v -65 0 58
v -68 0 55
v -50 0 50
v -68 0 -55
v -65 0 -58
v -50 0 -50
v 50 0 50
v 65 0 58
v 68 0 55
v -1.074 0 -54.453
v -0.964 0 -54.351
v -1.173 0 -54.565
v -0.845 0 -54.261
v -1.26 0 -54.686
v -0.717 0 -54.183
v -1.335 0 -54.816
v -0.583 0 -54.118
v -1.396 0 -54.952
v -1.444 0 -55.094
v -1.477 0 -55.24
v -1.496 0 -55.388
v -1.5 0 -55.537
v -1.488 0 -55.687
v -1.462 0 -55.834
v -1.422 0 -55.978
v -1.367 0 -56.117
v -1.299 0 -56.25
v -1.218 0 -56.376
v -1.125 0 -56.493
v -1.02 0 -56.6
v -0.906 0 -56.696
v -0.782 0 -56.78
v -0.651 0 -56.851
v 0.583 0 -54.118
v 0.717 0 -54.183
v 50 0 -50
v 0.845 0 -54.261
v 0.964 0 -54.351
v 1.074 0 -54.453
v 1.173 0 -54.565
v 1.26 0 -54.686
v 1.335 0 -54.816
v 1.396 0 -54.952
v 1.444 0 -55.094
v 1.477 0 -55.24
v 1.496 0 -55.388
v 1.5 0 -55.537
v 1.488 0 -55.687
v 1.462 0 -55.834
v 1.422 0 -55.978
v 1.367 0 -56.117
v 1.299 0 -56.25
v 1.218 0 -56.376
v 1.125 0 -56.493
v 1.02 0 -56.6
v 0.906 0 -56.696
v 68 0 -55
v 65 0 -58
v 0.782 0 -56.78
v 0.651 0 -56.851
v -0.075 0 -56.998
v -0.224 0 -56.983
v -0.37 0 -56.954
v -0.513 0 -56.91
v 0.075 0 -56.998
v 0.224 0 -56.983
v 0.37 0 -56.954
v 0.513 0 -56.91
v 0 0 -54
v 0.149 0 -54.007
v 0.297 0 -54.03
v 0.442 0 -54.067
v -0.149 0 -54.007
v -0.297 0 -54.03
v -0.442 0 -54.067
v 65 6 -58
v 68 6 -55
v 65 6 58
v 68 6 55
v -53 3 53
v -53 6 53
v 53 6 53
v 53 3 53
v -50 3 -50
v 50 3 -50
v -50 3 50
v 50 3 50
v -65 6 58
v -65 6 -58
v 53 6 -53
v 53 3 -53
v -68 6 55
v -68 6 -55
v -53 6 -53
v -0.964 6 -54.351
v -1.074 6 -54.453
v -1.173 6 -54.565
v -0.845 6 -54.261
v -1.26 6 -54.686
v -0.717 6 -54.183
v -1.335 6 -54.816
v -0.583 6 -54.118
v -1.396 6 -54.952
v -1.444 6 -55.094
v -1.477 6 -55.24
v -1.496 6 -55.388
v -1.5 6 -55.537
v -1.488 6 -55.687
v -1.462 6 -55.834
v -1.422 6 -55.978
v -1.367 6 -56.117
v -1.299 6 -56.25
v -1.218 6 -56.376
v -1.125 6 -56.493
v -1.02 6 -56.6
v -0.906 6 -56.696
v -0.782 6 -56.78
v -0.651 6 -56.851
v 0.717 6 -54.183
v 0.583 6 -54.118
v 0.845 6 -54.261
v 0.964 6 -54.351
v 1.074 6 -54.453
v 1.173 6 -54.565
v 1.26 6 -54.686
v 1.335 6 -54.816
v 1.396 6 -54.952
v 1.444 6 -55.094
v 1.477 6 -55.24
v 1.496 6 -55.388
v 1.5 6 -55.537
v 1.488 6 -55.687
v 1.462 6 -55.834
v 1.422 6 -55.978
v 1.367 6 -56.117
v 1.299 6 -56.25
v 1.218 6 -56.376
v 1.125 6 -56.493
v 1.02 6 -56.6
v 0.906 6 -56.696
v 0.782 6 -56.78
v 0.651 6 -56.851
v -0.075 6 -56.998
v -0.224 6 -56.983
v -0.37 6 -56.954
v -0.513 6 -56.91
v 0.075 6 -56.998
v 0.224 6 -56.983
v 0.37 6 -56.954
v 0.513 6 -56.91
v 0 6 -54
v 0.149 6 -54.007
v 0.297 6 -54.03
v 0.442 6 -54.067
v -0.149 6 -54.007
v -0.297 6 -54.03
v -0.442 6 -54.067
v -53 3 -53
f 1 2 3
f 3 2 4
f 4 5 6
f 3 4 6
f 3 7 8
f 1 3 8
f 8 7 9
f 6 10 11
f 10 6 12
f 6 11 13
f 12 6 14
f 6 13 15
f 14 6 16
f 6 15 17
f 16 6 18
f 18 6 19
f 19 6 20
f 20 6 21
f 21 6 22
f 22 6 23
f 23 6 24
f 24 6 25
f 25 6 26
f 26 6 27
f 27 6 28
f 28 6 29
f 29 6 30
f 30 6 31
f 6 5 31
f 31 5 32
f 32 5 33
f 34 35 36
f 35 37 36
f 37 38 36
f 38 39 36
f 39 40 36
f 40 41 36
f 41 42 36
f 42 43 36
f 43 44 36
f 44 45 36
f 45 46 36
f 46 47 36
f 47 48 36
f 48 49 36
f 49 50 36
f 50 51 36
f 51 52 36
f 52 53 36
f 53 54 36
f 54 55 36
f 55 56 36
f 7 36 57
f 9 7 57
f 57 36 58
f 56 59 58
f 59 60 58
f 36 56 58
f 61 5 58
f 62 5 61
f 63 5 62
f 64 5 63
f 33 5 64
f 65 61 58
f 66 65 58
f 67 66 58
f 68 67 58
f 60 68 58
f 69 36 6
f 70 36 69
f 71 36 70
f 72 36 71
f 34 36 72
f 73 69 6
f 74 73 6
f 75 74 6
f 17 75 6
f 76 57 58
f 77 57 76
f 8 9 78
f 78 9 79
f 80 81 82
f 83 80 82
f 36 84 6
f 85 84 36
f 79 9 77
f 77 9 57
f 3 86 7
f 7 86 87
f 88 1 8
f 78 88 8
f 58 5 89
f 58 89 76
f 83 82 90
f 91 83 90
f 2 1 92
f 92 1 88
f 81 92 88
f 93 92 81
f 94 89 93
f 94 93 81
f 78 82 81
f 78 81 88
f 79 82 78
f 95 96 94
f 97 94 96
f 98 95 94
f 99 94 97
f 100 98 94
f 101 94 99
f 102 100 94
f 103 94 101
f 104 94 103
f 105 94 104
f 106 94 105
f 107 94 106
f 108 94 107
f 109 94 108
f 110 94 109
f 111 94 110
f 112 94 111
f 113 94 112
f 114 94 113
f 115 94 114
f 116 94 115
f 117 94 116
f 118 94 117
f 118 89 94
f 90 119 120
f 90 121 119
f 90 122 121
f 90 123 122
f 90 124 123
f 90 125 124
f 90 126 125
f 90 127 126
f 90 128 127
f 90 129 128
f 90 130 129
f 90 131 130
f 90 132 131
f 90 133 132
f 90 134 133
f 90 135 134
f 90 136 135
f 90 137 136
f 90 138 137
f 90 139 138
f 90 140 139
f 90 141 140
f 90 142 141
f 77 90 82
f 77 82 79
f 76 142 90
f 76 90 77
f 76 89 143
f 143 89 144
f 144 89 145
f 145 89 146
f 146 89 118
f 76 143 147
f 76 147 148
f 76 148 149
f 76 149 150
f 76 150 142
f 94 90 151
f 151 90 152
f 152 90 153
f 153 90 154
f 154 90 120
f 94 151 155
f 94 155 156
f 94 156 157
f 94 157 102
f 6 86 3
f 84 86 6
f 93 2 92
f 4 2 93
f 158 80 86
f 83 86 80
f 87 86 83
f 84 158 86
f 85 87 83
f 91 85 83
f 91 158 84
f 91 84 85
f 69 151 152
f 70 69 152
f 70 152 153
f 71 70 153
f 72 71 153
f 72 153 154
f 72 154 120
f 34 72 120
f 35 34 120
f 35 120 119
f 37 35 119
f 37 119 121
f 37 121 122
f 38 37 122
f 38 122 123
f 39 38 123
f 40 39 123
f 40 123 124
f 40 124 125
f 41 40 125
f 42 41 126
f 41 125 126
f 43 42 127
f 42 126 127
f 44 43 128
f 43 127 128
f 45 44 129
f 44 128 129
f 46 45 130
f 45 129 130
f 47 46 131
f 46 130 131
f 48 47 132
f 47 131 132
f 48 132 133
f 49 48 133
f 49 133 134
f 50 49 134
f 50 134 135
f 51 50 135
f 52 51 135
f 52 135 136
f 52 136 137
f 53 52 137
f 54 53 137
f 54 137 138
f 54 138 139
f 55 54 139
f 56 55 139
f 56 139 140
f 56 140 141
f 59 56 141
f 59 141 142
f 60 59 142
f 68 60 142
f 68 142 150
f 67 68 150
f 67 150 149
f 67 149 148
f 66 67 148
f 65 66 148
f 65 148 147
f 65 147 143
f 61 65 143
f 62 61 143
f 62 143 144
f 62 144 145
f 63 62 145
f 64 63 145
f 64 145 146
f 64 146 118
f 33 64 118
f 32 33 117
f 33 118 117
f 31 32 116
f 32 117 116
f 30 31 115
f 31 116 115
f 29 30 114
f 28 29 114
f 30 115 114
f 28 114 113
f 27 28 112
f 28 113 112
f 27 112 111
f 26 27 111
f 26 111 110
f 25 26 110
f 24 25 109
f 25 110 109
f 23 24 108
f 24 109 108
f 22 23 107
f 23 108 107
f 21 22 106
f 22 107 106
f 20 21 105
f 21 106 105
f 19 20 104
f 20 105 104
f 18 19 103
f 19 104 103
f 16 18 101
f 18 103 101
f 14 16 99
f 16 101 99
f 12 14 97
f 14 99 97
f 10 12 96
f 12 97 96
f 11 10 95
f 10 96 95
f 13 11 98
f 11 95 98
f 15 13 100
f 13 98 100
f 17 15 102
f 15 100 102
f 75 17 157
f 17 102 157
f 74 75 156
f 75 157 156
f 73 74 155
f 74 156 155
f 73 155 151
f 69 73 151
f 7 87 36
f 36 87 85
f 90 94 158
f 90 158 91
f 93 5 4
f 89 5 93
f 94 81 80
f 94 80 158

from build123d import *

# Parameters (mm, degrees)
SKETCH_3_W          = 136
SKETCH_3_H          = 116
EXTRUDE_2_DEPTH     = 6
SKETCH_4_W          = 106
SKETCH_4_H          = 106
CUT_EXTRUDE_1_DEPTH = 3
SKETCH_5_W          = 100
SKETCH_5_H          = 100
CUT_EXTRUDE_2_DEPTH = 10
CHAMFER_1_SIZE      = 3
SKETCH_6_R          = 1.5
CUT_EXTRUDE_3_DEPTH = 10


with BuildPart() as part:
    # 스케치3 → 보스-돌출2 (new body)
    with BuildSketch(Plane(origin=(0, 0, 0), x_dir=(1, 0, 0), z_dir=(0, 1, 0))):
        Rectangle(SKETCH_3_W, SKETCH_3_H)
    extrude(amount=EXTRUDE_2_DEPTH)

    # 스케치4 → 컷-돌출1 (cut)
    with BuildSketch(Plane(origin=(0, 6, 0), x_dir=(1, 0, 0), z_dir=(0, 1, 0))):
        Rectangle(SKETCH_4_W, SKETCH_4_H)
    extrude(amount=-CUT_EXTRUDE_1_DEPTH, mode=Mode.SUBTRACT)

    # 스케치5 → 컷-돌출2 (cut)
    with BuildSketch(Plane(origin=(0, 3, 0), x_dir=(1, 0, 0), z_dir=(0, 1, 0))):
        Rectangle(SKETCH_5_W, SKETCH_5_H)
    extrude(amount=-CUT_EXTRUDE_2_DEPTH, mode=Mode.SUBTRACT)

    # 모따기1
    chamfer_1_edges = [part.edges().sort_by_distance(p)[0] for p in [
        (68, 3, 58),
        (-68, 3, 58),
        (-68, 3, -58),
        (68, 3, -58),
    ]]
    chamfer(chamfer_1_edges, length=CHAMFER_1_SIZE)

    # 스케치6 → 컷-돌출3 (cut)
    with BuildSketch(Plane(origin=(0, 6, 0), x_dir=(1, 0, 0), z_dir=(0, 1, 0))):
        with Locations(Location((0, 55.5, 0), (0, 0, 270))):
            Circle(SKETCH_6_R)
    extrude(amount=-CUT_EXTRUDE_3_DEPTH, mode=Mode.SUBTRACT)


solid = part.part
